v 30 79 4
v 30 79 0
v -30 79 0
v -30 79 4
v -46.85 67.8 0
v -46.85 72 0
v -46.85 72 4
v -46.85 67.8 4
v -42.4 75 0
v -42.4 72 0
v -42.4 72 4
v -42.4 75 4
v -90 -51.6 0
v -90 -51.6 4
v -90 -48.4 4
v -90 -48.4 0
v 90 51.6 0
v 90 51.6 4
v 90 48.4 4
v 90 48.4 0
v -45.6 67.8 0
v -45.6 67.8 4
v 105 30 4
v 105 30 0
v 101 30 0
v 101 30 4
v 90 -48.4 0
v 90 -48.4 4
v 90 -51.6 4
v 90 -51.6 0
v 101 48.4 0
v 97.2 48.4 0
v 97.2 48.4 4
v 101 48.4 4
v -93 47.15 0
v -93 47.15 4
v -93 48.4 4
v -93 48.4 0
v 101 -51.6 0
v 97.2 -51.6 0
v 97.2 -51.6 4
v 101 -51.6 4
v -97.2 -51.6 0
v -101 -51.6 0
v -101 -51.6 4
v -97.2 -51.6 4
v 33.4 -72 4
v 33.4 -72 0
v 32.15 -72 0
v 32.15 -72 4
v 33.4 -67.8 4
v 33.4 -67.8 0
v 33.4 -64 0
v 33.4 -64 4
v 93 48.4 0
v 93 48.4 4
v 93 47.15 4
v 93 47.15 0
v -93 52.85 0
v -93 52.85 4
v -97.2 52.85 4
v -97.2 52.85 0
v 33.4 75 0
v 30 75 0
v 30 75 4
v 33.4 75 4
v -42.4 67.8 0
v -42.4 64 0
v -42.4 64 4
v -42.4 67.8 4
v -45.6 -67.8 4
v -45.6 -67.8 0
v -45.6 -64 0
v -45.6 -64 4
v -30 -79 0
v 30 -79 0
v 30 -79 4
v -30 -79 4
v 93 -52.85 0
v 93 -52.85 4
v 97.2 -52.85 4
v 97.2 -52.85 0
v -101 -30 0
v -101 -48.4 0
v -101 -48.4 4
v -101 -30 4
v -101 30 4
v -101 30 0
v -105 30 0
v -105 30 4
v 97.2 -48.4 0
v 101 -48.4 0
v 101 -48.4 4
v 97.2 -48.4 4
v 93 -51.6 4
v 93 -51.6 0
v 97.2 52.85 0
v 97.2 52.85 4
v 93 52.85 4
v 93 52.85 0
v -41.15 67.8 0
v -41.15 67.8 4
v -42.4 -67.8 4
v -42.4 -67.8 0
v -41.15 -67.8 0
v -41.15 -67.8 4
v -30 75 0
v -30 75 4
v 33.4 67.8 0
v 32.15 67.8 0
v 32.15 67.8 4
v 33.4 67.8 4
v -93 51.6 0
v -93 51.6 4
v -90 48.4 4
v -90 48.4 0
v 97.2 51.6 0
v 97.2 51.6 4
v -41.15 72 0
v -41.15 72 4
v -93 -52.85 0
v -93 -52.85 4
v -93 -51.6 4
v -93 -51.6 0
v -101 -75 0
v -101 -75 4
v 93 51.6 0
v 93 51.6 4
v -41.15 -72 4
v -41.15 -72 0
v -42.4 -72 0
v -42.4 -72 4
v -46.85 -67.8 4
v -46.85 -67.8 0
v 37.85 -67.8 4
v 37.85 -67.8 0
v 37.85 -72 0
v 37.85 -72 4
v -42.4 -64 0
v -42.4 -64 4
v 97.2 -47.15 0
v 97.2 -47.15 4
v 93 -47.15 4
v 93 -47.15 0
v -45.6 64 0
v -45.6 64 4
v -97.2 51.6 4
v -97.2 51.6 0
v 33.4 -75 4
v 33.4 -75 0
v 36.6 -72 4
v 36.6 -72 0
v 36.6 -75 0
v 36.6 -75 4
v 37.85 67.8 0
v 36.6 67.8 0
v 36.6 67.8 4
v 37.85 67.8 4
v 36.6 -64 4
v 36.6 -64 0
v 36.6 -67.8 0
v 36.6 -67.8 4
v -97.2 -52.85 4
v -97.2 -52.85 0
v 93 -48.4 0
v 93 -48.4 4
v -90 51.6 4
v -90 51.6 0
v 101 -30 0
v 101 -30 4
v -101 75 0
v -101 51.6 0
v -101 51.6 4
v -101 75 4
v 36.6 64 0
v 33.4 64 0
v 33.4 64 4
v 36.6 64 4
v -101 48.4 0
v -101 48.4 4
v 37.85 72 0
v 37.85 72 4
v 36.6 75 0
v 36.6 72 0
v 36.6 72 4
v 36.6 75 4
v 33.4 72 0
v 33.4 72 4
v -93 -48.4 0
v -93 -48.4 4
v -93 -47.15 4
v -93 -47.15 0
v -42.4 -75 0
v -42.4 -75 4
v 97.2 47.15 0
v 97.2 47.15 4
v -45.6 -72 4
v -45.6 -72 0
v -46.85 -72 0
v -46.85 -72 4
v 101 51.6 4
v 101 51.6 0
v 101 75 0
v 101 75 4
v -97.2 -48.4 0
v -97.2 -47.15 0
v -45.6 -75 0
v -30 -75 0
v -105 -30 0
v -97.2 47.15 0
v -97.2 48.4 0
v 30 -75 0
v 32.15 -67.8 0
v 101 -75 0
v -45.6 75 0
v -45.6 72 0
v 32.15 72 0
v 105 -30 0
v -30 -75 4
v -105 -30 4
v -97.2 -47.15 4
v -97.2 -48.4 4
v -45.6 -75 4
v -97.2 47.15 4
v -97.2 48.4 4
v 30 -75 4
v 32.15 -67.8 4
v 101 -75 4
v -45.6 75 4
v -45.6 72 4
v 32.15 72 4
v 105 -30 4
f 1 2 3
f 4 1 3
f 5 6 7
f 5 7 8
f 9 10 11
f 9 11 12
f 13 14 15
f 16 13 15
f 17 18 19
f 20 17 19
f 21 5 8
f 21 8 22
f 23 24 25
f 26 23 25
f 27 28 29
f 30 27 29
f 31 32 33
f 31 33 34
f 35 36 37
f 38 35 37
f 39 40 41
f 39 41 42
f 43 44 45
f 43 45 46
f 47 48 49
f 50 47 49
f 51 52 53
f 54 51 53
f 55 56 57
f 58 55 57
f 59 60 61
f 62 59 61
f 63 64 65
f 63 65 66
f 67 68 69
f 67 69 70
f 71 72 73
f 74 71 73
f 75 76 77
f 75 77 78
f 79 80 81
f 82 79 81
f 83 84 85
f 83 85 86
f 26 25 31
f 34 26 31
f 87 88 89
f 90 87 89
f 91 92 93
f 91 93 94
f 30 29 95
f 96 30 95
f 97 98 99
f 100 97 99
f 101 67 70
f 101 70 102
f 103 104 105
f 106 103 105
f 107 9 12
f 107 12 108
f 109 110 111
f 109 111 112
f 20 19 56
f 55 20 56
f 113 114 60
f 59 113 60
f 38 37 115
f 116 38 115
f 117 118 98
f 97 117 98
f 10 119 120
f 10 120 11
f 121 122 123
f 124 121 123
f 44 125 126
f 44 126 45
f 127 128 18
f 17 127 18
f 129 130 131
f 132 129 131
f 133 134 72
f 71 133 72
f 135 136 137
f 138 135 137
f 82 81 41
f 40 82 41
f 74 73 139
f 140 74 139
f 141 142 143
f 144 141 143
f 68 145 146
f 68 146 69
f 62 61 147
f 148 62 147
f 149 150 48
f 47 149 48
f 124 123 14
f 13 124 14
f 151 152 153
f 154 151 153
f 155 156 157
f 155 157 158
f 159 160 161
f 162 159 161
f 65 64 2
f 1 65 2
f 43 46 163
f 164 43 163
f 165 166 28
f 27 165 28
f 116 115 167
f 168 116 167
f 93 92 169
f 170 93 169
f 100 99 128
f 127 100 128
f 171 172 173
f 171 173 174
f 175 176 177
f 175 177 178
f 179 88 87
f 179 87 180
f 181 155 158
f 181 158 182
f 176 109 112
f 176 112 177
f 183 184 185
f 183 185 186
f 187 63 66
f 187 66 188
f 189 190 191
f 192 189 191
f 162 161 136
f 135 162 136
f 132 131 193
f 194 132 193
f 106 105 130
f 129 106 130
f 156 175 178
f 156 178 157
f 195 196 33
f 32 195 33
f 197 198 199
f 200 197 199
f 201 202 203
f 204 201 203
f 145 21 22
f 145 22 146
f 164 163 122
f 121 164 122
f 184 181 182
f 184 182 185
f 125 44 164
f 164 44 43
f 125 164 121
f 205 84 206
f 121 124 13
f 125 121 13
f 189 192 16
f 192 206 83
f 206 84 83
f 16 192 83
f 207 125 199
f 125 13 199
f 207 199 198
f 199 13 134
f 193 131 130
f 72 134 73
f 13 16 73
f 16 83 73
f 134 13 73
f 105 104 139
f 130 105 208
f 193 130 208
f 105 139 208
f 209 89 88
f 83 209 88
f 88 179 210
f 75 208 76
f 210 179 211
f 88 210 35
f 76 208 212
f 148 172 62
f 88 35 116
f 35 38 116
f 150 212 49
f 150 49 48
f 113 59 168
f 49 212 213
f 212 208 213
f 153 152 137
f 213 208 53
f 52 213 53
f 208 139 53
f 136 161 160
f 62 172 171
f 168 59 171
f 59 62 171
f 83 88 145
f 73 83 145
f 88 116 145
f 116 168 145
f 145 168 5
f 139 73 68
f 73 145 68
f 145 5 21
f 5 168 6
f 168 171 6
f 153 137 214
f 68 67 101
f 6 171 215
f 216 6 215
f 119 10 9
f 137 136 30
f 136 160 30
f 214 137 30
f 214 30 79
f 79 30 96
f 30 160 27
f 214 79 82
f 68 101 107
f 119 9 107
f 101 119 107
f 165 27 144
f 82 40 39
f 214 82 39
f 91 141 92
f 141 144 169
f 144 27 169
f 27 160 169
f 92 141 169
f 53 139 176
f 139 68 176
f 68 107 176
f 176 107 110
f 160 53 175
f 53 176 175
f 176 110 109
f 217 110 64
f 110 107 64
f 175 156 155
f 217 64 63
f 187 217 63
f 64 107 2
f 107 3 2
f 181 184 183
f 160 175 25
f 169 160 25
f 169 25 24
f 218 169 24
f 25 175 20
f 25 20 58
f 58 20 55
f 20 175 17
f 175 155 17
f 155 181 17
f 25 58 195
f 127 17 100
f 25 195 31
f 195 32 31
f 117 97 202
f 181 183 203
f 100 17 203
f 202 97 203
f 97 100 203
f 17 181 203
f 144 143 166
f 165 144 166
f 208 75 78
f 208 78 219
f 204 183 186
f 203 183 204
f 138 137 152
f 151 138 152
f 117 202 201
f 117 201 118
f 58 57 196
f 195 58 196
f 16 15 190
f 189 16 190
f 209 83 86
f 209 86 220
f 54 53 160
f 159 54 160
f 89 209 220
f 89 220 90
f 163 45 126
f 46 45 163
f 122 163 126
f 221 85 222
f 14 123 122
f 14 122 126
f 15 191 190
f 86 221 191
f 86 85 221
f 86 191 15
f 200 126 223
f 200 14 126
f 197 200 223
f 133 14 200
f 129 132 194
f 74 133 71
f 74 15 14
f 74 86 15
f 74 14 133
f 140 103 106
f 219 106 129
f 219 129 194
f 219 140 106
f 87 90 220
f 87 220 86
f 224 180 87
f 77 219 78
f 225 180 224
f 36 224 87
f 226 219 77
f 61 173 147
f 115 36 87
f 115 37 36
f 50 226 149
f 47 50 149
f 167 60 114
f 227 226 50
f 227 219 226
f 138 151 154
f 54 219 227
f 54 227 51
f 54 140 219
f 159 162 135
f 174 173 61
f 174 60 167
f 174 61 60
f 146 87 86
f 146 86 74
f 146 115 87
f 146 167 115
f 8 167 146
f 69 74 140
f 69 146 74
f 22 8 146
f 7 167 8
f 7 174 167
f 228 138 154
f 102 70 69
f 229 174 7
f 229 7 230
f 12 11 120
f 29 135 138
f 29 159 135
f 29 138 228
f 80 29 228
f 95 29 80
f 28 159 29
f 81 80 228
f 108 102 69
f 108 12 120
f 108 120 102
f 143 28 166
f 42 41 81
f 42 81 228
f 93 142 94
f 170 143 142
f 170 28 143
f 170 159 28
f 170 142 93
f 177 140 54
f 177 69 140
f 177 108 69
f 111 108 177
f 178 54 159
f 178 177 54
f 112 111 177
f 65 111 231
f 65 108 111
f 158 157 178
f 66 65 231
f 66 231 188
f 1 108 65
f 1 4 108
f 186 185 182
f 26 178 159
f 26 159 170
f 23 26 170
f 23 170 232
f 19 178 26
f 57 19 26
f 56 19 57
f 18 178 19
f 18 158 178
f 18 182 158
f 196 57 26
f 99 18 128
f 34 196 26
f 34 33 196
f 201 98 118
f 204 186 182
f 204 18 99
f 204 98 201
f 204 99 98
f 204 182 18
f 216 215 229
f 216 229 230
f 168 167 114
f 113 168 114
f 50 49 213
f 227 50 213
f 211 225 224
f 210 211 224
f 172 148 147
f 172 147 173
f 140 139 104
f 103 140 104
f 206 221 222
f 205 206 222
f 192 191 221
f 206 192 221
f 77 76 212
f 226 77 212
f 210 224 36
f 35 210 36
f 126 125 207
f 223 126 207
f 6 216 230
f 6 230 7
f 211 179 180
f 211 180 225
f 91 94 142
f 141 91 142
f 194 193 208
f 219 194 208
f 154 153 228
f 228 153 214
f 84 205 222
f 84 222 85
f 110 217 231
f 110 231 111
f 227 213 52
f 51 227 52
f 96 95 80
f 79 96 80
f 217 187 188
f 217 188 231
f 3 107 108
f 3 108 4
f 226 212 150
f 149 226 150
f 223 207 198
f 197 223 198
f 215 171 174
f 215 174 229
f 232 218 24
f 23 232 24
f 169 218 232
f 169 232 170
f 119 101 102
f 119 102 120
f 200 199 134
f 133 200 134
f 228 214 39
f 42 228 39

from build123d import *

# Parameters (mm, degrees)
ESQUISSE1_W             = 202
ESQUISSE1_H             = 150
BOSS_EXTRU_1_DEPTH      = 4
ESQUISSE2_W             = 4
ESQUISSE2_H             = 60
ESQUISSE2_W_2           = 60
ESQUISSE2_H_2           = 4
BOSS_EXTRU_2_DEPTH      = 4
ENL_V_MAT_EXTRU_1_DEPTH = 10
ENL_V_MAT_EXTRU_2_DEPTH = 4


with BuildPart() as part:
    # Esquisse1 → Boss.-Extru.1 (new body)
    with BuildSketch(Plane.XY):
        Rectangle(ESQUISSE1_W, ESQUISSE1_H)
    extrude(amount=BOSS_EXTRU_1_DEPTH)

    # Esquisse2 → Boss.-Extru.2 (add)
    with BuildSketch(Plane(origin=(0, 0, 0), x_dir=(-1, 0, 0), z_dir=(0, 0, -1))):
        with Locations((-103, 0)):
            Rectangle(ESQUISSE2_W, ESQUISSE2_H)
        with Locations((103, 0)):
            Rectangle(ESQUISSE2_W, ESQUISSE2_H)
        with Locations((0, -77)):
            Rectangle(ESQUISSE2_W_2, ESQUISSE2_H_2)
        with Locations((0, 77)):
            Rectangle(ESQUISSE2_W_2, ESQUISSE2_H_2)
    extrude(amount=-BOSS_EXTRU_2_DEPTH)

    # Esquisse3 → Enlèv. mat.-Extru.1 (cut)
    with BuildSketch(Plane(origin=(0, 0, 0), x_dir=(-1, 0, 0), z_dir=(0, 0, -1))):
        Polygon((42.4, 75), (45.6, 75), (45.6, 72), (46.85, 72), (46.85, 67.8), (45.6, 67.8), (45.6, 64), (42.4, 64), (42.4, 67.8), (41.15, 67.8), (41.15, 72), (42.4, 72), align=None)
        Polygon((-36.6, 75), (-33.4, 75), (-33.4, 72), (-32.15, 72), (-32.15, 67.8), (-33.4, 67.8), (-33.4, 64), (-36.6, 64), (-36.6, 67.8), (-37.85, 67.8), (-37.85, 72), (-36.6, 72), align=None)
        Polygon((-33.4, -75), (-33.4, -72), (-32.15, -72), (-32.15, -67.8), (-33.4, -67.8), (-33.4, -64), (-36.6, -64), (-36.6, -67.8), (-37.85, -67.8), (-37.85, -72), (-36.6, -72), (-36.6, -75), align=None)
        Polygon((45.6, -75), (45.6, -72), (46.85, -72), (46.85, -67.8), (45.6, -67.8), (45.6, -64), (42.4, -64), (42.4, -67.8), (41.15, -67.8), (41.15, -72), (42.4, -72), (42.4, -75), align=None)
    extrude(amount=-ENL_V_MAT_EXTRU_1_DEPTH, mode=Mode.SUBTRACT)

    # Esquisse4 → Enlèv. mat.-Extru.2 (cut)
    with BuildSketch(Plane.XY.offset(4)):
        Polygon((90, 48.4), (93, 48.4), (93, 47.15), (97.2, 47.15), (97.2, 48.4), (101, 48.4), (101, 51.6), (97.2, 51.6), (97.2, 52.85), (93, 52.85), (93, 51.6), (90, 51.6), align=None)
        Polygon((97.2, -51.6), (101, -51.6), (101, -48.4), (97.2, -48.4), (97.2, -47.15), (93, -47.15), (93, -48.4), (90, -48.4), (90, -51.6), (93, -51.6), (93, -52.85), (97.2, -52.85), align=None)
        Polygon((-90, -48.4), (-93, -48.4), (-93, -47.15), (-97.2, -47.15), (-97.2, -48.4), (-101, -48.4), (-101, -51.6), (-97.2, -51.6), (-97.2, -52.85), (-93, -52.85), (-93, -51.6), (-90, -51.6), align=None)
        Polygon((-97.2, 51.6), (-101, 51.6), (-101, 48.4), (-97.2, 48.4), (-97.2, 47.15), (-93, 47.15), (-93, 48.4), (-90, 48.4), (-90, 51.6), (-93, 51.6), (-93, 52.85), (-97.2, 52.85), align=None)
    extrude(amount=-ENL_V_MAT_EXTRU_2_DEPTH, mode=Mode.SUBTRACT)


solid = part.part
